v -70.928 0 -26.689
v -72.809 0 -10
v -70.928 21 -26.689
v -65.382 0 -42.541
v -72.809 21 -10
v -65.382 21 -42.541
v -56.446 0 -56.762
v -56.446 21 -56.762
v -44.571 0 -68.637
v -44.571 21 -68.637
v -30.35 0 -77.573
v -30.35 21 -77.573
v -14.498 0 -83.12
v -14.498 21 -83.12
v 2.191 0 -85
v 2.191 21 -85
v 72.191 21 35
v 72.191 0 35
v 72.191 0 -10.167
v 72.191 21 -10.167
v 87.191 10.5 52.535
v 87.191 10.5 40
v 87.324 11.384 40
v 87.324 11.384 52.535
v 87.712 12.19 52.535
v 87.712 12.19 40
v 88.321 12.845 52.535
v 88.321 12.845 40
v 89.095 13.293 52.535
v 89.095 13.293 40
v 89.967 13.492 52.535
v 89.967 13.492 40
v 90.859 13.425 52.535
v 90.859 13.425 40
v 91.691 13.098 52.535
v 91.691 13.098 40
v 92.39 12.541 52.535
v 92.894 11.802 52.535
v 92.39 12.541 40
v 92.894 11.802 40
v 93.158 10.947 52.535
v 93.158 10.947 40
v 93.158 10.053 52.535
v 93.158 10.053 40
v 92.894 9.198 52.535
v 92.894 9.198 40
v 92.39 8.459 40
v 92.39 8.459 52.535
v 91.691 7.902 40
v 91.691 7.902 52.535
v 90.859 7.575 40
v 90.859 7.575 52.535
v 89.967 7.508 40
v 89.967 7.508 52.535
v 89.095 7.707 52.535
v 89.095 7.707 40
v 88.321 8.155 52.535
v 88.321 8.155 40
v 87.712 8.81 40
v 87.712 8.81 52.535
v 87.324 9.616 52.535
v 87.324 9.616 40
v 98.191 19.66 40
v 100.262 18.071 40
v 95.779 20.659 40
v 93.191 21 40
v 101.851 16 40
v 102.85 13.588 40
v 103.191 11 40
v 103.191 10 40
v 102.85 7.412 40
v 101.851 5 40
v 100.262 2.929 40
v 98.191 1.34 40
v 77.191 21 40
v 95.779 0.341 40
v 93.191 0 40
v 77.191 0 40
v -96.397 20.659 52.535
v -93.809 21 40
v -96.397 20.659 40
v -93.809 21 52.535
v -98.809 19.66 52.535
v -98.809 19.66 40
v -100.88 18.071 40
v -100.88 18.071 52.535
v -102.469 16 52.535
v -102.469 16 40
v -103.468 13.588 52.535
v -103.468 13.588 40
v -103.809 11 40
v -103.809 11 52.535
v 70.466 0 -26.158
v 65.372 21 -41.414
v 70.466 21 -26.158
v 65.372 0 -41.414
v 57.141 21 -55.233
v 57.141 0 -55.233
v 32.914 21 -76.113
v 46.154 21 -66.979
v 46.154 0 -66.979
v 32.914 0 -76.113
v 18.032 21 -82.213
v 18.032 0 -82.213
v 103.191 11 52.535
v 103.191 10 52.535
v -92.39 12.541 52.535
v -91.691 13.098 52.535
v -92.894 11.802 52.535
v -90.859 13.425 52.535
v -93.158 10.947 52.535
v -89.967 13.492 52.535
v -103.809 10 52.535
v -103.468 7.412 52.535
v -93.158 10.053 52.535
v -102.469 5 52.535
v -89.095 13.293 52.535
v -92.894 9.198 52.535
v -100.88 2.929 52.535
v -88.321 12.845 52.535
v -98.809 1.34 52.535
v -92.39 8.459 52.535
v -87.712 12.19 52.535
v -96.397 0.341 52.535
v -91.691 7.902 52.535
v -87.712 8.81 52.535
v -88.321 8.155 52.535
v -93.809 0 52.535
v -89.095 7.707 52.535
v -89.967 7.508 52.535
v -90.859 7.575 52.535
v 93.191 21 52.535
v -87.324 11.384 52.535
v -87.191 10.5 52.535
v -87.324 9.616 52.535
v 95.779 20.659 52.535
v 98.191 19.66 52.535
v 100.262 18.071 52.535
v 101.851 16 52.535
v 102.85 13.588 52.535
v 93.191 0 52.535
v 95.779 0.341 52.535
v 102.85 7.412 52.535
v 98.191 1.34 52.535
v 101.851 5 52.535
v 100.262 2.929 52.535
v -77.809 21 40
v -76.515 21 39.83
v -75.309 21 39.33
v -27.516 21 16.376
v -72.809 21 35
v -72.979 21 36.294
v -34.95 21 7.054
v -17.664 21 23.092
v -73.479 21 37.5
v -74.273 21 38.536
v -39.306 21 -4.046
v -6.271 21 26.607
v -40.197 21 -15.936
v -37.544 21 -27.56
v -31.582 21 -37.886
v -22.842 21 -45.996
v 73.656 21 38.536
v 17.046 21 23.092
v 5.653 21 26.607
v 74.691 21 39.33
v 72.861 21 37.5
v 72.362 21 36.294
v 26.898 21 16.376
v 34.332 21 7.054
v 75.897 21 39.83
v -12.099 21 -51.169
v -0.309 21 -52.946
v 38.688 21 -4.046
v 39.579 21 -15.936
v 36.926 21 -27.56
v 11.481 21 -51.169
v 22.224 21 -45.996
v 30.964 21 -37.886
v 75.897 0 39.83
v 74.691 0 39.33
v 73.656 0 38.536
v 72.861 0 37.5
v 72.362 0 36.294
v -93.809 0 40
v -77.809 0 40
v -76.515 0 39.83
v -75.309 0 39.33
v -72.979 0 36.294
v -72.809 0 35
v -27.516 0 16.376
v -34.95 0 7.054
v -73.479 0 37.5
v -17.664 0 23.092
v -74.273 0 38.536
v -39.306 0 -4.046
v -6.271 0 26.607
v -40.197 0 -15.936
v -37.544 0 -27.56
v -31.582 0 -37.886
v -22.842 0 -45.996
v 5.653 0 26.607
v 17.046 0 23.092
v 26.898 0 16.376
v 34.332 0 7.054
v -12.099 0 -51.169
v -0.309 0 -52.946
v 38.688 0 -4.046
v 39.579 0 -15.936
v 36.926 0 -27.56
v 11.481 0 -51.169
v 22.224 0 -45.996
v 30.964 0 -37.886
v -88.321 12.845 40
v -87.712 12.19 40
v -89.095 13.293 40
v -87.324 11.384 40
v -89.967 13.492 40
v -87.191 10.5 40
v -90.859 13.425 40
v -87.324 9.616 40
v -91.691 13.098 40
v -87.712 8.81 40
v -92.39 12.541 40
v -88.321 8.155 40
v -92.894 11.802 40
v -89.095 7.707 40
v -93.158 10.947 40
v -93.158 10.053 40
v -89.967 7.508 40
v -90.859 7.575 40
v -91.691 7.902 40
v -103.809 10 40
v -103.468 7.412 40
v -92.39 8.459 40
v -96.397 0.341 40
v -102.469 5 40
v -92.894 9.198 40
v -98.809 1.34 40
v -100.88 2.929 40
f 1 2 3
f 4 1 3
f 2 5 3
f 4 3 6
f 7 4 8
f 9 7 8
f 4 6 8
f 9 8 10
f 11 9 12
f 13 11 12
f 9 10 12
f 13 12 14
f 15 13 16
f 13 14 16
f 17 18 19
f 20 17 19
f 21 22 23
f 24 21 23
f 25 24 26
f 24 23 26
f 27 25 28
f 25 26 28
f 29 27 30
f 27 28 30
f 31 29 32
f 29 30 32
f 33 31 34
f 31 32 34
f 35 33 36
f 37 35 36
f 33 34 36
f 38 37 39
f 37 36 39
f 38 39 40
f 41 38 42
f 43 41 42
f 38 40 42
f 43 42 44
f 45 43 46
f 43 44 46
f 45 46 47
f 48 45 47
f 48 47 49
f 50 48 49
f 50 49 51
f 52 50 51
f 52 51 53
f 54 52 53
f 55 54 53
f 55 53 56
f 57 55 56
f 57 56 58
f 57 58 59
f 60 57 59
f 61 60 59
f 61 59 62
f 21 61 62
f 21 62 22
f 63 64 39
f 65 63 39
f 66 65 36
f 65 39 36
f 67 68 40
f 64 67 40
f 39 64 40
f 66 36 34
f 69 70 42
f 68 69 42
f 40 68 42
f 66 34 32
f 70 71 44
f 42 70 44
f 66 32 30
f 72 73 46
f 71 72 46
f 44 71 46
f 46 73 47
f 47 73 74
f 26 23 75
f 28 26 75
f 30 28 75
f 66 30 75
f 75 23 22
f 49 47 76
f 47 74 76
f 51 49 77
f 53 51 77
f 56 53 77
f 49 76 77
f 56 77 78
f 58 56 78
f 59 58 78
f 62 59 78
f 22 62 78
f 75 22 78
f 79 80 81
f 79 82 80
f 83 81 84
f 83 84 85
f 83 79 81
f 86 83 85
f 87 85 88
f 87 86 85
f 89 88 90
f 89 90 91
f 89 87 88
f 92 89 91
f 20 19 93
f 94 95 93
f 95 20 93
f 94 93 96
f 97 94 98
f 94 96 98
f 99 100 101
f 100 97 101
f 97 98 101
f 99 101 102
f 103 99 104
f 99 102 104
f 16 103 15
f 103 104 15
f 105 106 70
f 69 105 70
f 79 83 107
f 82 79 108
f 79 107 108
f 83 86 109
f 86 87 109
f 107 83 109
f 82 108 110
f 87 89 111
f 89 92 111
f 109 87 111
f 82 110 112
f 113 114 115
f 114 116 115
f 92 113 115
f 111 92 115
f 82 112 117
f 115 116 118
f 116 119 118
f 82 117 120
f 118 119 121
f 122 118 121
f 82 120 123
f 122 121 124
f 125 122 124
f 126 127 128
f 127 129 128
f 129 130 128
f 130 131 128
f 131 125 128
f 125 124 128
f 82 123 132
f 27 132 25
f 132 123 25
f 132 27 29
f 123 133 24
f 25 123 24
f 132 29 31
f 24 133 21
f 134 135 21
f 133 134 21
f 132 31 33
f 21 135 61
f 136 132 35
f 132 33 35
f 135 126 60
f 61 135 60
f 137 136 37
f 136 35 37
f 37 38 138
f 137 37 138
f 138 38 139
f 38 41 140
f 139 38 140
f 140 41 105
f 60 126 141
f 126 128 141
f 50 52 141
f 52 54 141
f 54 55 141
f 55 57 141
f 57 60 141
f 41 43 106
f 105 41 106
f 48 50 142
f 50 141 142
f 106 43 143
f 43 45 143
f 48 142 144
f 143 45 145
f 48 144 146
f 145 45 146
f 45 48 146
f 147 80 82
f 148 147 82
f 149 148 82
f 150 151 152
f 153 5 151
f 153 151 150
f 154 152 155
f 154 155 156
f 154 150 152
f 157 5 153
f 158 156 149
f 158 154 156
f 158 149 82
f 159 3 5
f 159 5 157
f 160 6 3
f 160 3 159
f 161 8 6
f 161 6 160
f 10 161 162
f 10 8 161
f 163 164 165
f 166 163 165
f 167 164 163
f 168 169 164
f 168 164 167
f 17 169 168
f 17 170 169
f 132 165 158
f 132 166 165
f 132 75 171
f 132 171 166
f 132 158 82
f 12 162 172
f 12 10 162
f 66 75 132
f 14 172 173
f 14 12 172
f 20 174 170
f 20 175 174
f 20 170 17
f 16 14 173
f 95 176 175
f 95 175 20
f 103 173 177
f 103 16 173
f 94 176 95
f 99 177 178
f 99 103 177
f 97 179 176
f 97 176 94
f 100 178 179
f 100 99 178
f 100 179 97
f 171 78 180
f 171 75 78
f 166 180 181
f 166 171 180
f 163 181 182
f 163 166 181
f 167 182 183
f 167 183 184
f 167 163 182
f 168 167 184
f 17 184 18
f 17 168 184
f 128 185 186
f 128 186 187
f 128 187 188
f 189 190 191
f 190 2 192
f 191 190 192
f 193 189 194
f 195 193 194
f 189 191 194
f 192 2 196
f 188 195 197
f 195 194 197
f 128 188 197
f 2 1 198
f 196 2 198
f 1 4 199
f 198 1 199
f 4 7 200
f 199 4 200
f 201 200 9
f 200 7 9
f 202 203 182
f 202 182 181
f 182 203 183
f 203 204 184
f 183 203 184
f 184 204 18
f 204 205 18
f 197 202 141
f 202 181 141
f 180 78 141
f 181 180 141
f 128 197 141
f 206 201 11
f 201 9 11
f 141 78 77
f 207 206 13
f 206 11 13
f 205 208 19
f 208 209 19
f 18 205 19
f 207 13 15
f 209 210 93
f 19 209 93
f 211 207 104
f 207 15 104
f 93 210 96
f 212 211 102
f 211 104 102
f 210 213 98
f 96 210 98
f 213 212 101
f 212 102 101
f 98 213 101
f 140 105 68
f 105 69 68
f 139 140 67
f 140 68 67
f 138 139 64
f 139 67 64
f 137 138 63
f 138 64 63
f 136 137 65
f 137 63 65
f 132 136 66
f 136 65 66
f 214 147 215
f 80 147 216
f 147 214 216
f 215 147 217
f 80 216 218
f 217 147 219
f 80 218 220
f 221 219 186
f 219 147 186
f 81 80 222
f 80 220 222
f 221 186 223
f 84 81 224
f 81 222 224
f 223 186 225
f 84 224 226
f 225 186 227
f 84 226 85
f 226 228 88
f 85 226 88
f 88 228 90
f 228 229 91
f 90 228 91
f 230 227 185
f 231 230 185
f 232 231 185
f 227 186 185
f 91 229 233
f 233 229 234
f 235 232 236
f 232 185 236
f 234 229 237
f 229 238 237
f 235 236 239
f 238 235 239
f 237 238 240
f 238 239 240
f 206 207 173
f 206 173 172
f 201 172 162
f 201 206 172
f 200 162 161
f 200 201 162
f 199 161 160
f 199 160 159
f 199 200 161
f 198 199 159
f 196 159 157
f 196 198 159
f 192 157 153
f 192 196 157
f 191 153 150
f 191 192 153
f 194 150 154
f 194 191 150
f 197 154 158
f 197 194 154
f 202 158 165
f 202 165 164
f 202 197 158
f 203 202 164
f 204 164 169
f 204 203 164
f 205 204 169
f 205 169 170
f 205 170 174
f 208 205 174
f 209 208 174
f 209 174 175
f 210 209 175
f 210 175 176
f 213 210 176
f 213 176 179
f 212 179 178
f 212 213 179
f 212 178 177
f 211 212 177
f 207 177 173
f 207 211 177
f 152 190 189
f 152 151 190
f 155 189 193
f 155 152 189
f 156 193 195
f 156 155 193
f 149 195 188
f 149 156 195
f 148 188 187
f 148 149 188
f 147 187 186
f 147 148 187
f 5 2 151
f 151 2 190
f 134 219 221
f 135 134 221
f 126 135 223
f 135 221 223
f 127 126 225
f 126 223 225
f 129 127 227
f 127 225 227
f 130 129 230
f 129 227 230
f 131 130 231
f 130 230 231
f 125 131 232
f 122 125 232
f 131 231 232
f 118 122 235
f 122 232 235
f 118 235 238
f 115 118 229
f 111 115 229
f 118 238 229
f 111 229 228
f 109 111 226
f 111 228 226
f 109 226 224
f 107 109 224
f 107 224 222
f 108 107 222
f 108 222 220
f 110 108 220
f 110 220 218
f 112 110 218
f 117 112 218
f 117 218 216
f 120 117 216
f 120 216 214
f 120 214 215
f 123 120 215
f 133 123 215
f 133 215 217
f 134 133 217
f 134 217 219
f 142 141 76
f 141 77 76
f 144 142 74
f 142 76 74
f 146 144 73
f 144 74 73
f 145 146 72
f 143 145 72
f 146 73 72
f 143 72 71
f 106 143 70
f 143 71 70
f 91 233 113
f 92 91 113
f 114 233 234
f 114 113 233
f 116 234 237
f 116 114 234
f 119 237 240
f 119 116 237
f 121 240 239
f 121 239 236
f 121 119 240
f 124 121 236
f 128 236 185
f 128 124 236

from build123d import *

# Parameters (mm, degrees)
SKETCH1_R           = 40
BOSS_EXTRUDE1_DEPTH = 21
FILLET1_R           = 10
FILLET2_R           = 10
FILLET3_R           = 10
FILLET4_R           = 10
FILLET5_R           = 5
FILLET6_R           = 5
FILLET7_R           = 75
FILLET8_R           = 75
SKETCH2_R           = 3
CUT_EXTRUDE1_DEPTH  = 164.836129338


with BuildPart() as part:
    # Sketch1 → Boss-Extrude1 (new body)
    with BuildSketch(Plane(origin=(0, 0, 0), x_dir=(1, 0, 0), z_dir=(0, 1, 0))):
        Polygon((0.191150297, -52.534941872), (103.191150297, -52.534941872), (103.191150297, -40), (72.191150297, -40), (72.191150297, 85), (0.191150297, 85), (-72.808849703, 85), (-72.808849703, -40), (-103.808849703, -40), (-103.808849703, -52.534941872), align=None)
        with Locations(Location((-0.308849703, 12.94638448, 0), (0, 0, 90))):
            Circle(SKETCH1_R, mode=Mode.SUBTRACT)
    extrude(amount=BOSS_EXTRUDE1_DEPTH)

    # Fillet1
    fillet1_edges = [part.edges().sort_by_distance(p)[0] for p in [
        (103.191150297, 21, 46.267470936),
    ]]
    fillet(fillet1_edges, radius=FILLET1_R)

    # Fillet2
    fillet2_edges = [part.edges().sort_by_distance(p)[0] for p in [
        (-103.808849703, 21, 46.267470936),
    ]]
    fillet(fillet2_edges, radius=FILLET2_R)

    # Fillet3
    fillet3_edges = [part.edges().sort_by_distance(p)[0] for p in [
        (-103.808849703, 0, 46.267470936),
    ]]
    fillet(fillet3_edges, radius=FILLET3_R)

    # Fillet4
    fillet4_edges = [part.edges().sort_by_distance(p)[0] for p in [
        (103.191150297, 0, 46.267470936),
    ]]
    fillet(fillet4_edges, radius=FILLET4_R)

    # Fillet5
    fillet5_edges = [part.edges().sort_by_distance(p)[0] for p in [
        (72.191150297, 10.5, 40),
    ]]
    fillet(fillet5_edges, radius=FILLET5_R)

    # Fillet6
    fillet6_edges = [part.edges().sort_by_distance(p)[0] for p in [
        (-72.808849703, 10.5, 40),
    ]]
    fillet(fillet6_edges, radius=FILLET6_R)

    # Fillet7
    fillet7_edges = [part.edges().sort_by_distance(p)[0] for p in [
        (-72.808849703, 10.5, -85),
    ]]
    fillet(fillet7_edges, radius=FILLET7_R)

    # Fillet8
    # the kernel refuses this fillet: 75 mm, written as the material it takes off along each edge
    with BuildSketch(Plane(origin=(72.191150297, -187.082869339, -85), x_dir=(-1, 0, 0), z_dir=(0, 1, 0))) as fillet8_piece_1:
        with BuildLine():
            CenterArc((75, 74.833147735), FILLET8_R, 180, 86.177446271)
            Line((0, 74.833147735), (-1.5, 74.833147735))
            Line((-1.5, 74.833147735), (-1.5, 0))
            Line((-1.5, 0), (0, -1.5))
            ThreePointArc((0, -1.5), (35, -1.5), (69.9, -1.496662955))
            Line((69.9, -1.496662955), (70, 0))
        make_face()
    extrude(amount=395.165738677, mode=Mode.SUBTRACT)

    # Sketch2 → Cut-Extrude1 (cut, through all)
    with BuildSketch(Plane(origin=(0, 0, 40), x_dir=(-1, 0, 0), z_dir=(0, 0, -1))):
        with Locations((-90.191150297, 10.5)):
            Circle(SKETCH2_R)
        with Locations(Location((90.191150297, 10.5, 0), (0, 0, 180))):
            Circle(SKETCH2_R)
    extrude(amount=-CUT_EXTRUDE1_DEPTH, mode=Mode.SUBTRACT)


solid = part.part
